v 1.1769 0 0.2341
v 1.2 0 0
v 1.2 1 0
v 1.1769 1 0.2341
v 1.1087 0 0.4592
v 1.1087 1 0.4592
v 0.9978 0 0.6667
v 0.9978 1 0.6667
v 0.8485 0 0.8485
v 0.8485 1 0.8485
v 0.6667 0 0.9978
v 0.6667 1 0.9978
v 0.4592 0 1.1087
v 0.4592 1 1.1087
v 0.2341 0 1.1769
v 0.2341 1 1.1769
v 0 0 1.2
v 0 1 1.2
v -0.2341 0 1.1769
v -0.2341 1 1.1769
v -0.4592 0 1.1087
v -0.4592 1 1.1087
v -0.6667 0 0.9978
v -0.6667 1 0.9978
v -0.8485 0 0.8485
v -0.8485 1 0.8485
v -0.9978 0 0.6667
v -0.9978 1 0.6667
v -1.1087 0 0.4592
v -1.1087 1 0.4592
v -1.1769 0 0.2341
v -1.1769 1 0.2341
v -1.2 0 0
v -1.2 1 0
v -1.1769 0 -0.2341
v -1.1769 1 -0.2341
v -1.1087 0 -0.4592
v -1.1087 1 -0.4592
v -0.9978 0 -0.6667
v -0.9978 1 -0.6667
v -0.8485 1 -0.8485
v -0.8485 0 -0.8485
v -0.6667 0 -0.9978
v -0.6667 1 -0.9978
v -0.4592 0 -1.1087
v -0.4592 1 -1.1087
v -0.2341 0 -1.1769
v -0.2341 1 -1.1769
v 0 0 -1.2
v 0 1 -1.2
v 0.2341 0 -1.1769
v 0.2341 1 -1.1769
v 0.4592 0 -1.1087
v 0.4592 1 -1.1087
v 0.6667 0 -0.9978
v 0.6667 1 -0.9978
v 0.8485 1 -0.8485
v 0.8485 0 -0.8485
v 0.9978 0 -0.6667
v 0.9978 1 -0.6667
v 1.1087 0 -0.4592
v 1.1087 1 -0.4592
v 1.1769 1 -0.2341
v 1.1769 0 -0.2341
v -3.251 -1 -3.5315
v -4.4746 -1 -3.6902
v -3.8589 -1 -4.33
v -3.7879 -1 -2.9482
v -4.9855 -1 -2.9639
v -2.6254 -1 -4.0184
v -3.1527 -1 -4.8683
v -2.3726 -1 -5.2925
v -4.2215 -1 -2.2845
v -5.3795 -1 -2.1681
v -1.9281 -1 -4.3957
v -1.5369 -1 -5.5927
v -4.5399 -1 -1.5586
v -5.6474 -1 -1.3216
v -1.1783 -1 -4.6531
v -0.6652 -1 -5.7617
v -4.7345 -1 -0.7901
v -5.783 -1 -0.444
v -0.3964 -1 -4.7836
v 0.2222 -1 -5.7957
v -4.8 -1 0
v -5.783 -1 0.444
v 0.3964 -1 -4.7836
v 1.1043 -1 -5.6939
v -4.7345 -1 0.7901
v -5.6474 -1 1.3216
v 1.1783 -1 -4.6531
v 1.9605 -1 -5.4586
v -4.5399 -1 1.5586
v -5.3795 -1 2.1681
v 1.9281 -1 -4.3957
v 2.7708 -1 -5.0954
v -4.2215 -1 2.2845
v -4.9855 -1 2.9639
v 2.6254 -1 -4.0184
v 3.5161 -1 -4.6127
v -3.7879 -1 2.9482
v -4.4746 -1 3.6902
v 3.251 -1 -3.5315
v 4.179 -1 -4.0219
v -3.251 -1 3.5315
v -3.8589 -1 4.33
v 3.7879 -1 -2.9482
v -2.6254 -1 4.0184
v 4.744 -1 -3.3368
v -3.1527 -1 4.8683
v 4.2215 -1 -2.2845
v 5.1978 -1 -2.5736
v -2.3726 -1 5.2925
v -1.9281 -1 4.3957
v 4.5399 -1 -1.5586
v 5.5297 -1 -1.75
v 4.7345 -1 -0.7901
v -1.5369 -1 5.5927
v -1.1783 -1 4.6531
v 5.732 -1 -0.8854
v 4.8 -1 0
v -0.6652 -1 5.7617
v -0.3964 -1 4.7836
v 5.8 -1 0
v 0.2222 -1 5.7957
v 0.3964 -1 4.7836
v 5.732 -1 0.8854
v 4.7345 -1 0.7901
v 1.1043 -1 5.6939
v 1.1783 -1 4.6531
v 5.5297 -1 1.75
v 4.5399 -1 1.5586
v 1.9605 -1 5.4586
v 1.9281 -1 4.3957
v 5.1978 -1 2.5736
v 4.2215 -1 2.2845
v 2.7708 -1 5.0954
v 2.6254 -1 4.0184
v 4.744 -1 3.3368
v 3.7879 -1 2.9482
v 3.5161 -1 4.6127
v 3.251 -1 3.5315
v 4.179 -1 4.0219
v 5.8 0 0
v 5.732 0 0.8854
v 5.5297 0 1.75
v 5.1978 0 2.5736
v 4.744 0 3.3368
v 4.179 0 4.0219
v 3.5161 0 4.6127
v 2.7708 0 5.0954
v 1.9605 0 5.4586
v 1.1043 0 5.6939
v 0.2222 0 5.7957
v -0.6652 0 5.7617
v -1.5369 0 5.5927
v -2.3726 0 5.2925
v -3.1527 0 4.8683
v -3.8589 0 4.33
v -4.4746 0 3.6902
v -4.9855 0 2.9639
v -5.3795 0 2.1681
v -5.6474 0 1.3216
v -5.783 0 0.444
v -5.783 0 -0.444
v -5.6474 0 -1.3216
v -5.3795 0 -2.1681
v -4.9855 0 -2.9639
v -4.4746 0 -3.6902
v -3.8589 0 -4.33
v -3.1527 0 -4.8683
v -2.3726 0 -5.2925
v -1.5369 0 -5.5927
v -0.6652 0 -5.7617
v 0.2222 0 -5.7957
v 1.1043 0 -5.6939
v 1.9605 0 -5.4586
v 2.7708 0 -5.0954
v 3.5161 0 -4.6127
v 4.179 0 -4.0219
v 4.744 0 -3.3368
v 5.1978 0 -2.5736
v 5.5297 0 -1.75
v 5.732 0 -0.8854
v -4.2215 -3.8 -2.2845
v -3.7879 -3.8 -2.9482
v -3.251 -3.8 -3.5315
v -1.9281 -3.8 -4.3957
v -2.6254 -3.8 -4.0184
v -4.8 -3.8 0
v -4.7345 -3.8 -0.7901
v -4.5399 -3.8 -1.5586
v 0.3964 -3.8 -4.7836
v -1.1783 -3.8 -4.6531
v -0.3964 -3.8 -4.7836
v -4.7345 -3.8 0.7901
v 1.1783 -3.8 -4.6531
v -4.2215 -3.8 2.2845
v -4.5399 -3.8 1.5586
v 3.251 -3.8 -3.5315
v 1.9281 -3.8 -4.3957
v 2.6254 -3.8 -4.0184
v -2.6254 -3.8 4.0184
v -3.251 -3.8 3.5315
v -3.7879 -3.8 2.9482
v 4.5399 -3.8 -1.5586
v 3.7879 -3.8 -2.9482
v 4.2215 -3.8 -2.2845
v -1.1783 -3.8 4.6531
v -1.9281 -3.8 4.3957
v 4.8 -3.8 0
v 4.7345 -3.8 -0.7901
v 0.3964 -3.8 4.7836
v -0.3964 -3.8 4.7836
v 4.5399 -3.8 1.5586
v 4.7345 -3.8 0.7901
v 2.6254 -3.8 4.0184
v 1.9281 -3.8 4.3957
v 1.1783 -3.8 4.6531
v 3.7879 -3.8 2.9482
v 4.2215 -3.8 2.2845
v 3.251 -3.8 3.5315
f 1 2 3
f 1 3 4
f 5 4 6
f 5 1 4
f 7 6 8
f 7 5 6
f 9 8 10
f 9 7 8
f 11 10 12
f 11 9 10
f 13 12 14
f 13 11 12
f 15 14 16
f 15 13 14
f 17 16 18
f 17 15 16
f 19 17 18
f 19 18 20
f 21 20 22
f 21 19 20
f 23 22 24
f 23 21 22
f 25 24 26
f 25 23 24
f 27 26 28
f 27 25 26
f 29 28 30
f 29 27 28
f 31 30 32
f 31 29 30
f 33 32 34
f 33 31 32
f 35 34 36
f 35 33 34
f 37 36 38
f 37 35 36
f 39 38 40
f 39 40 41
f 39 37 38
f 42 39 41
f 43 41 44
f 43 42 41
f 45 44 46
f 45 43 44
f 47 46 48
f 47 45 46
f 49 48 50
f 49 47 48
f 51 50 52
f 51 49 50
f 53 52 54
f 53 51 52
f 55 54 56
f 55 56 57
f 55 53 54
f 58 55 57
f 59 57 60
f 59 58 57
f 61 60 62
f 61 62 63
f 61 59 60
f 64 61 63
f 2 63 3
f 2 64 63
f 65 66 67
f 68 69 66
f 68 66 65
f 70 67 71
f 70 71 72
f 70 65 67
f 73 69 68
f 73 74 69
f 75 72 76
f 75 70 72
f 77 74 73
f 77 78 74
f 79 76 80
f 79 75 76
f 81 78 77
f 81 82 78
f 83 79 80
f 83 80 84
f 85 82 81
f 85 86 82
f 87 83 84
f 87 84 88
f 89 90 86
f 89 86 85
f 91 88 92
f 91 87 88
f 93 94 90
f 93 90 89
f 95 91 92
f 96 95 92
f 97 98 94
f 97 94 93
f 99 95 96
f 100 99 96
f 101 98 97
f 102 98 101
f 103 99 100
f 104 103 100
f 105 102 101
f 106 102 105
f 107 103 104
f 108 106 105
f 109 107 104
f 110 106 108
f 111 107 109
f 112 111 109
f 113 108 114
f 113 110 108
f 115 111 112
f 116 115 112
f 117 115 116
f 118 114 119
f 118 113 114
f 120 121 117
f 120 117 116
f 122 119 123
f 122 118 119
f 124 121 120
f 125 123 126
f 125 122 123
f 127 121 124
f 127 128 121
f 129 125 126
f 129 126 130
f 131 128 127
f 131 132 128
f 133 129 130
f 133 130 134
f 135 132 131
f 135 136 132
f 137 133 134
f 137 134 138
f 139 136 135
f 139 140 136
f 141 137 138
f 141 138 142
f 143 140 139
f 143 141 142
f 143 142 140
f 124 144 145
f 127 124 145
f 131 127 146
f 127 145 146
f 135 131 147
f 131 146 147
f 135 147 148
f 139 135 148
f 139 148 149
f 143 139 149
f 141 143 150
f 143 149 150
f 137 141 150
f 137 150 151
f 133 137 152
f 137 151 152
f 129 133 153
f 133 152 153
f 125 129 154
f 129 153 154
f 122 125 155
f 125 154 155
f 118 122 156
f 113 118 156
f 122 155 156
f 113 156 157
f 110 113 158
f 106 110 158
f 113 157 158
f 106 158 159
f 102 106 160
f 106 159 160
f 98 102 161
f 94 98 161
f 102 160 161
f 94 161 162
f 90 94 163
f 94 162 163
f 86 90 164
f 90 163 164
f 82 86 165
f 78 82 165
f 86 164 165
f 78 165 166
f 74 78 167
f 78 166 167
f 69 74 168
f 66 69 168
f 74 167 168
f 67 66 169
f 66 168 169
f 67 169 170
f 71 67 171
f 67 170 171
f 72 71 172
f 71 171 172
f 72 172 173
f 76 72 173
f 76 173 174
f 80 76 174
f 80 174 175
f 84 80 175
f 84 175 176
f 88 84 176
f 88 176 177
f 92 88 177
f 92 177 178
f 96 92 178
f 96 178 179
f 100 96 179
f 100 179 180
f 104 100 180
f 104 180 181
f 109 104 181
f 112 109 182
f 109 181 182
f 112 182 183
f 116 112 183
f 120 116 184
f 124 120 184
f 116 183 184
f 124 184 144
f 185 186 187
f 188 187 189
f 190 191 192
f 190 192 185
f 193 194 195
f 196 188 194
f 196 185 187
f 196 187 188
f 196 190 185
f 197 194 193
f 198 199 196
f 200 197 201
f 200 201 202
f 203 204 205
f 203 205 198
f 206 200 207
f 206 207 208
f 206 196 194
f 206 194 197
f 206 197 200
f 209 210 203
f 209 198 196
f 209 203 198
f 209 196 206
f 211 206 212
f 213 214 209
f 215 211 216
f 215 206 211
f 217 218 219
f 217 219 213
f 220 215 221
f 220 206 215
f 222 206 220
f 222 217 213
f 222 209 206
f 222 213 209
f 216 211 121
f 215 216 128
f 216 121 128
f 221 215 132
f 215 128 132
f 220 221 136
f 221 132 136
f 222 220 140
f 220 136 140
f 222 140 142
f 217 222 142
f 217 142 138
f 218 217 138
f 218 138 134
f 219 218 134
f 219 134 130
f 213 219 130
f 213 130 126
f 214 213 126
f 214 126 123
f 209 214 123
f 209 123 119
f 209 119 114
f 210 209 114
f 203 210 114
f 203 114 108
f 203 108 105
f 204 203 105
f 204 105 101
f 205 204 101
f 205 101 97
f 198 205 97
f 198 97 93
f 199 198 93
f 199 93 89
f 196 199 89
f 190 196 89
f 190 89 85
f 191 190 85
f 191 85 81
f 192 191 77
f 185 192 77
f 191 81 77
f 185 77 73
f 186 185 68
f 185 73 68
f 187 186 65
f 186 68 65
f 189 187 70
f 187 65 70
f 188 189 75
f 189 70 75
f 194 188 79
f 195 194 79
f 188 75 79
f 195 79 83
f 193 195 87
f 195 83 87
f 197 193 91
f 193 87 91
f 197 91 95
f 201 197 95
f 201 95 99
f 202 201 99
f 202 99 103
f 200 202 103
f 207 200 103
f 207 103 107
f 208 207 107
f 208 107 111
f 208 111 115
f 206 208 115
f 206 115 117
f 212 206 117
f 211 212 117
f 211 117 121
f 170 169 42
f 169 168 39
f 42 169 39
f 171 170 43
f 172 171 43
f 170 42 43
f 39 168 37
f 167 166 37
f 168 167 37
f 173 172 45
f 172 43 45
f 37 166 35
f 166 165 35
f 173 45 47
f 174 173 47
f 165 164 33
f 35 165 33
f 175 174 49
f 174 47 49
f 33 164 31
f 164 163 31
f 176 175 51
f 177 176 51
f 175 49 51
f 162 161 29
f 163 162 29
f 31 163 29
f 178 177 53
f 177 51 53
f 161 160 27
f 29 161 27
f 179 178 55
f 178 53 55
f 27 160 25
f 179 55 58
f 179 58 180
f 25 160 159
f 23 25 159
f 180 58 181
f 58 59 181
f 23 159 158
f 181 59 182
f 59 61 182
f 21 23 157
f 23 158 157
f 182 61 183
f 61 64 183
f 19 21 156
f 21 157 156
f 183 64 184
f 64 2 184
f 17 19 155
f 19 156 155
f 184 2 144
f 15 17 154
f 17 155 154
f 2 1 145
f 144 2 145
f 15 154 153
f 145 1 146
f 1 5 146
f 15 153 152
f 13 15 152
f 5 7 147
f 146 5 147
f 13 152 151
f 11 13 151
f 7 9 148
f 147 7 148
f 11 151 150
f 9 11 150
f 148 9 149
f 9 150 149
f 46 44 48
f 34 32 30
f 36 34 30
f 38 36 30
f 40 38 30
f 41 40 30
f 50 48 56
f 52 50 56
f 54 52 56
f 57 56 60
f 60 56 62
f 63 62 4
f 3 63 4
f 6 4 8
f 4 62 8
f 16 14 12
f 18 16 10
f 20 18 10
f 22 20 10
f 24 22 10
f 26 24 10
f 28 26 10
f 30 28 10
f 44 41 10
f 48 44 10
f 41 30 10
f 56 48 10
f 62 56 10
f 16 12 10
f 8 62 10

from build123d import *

# Parameters (mm, degrees)
F0_R     = 5.8
F0_R_2   = 4.8
F1_DEPTH = 1
F2_DEPTH = 3.8
F3_R     = 1.2
F4_DEPTH = 1


with BuildPart() as f1:
    # F0 (on Front) → F1 (new body)
    with BuildSketch(Plane.XZ):
        Circle(F0_R)
        Circle(F0_R_2, mode=Mode.SUBTRACT)
        Circle(F0_R_2)
    extrude(amount=F1_DEPTH)

    # F0 (on Front) → F2 (join)
    with BuildSketch(Plane.XZ):
        Circle(F0_R_2)
    extrude(amount=F2_DEPTH)

    # F3 (on face) → F4 (join)
    with BuildSketch(Plane.XZ):
        Circle(F3_R)
    extrude(amount=-F4_DEPTH)


solid = f1.part
